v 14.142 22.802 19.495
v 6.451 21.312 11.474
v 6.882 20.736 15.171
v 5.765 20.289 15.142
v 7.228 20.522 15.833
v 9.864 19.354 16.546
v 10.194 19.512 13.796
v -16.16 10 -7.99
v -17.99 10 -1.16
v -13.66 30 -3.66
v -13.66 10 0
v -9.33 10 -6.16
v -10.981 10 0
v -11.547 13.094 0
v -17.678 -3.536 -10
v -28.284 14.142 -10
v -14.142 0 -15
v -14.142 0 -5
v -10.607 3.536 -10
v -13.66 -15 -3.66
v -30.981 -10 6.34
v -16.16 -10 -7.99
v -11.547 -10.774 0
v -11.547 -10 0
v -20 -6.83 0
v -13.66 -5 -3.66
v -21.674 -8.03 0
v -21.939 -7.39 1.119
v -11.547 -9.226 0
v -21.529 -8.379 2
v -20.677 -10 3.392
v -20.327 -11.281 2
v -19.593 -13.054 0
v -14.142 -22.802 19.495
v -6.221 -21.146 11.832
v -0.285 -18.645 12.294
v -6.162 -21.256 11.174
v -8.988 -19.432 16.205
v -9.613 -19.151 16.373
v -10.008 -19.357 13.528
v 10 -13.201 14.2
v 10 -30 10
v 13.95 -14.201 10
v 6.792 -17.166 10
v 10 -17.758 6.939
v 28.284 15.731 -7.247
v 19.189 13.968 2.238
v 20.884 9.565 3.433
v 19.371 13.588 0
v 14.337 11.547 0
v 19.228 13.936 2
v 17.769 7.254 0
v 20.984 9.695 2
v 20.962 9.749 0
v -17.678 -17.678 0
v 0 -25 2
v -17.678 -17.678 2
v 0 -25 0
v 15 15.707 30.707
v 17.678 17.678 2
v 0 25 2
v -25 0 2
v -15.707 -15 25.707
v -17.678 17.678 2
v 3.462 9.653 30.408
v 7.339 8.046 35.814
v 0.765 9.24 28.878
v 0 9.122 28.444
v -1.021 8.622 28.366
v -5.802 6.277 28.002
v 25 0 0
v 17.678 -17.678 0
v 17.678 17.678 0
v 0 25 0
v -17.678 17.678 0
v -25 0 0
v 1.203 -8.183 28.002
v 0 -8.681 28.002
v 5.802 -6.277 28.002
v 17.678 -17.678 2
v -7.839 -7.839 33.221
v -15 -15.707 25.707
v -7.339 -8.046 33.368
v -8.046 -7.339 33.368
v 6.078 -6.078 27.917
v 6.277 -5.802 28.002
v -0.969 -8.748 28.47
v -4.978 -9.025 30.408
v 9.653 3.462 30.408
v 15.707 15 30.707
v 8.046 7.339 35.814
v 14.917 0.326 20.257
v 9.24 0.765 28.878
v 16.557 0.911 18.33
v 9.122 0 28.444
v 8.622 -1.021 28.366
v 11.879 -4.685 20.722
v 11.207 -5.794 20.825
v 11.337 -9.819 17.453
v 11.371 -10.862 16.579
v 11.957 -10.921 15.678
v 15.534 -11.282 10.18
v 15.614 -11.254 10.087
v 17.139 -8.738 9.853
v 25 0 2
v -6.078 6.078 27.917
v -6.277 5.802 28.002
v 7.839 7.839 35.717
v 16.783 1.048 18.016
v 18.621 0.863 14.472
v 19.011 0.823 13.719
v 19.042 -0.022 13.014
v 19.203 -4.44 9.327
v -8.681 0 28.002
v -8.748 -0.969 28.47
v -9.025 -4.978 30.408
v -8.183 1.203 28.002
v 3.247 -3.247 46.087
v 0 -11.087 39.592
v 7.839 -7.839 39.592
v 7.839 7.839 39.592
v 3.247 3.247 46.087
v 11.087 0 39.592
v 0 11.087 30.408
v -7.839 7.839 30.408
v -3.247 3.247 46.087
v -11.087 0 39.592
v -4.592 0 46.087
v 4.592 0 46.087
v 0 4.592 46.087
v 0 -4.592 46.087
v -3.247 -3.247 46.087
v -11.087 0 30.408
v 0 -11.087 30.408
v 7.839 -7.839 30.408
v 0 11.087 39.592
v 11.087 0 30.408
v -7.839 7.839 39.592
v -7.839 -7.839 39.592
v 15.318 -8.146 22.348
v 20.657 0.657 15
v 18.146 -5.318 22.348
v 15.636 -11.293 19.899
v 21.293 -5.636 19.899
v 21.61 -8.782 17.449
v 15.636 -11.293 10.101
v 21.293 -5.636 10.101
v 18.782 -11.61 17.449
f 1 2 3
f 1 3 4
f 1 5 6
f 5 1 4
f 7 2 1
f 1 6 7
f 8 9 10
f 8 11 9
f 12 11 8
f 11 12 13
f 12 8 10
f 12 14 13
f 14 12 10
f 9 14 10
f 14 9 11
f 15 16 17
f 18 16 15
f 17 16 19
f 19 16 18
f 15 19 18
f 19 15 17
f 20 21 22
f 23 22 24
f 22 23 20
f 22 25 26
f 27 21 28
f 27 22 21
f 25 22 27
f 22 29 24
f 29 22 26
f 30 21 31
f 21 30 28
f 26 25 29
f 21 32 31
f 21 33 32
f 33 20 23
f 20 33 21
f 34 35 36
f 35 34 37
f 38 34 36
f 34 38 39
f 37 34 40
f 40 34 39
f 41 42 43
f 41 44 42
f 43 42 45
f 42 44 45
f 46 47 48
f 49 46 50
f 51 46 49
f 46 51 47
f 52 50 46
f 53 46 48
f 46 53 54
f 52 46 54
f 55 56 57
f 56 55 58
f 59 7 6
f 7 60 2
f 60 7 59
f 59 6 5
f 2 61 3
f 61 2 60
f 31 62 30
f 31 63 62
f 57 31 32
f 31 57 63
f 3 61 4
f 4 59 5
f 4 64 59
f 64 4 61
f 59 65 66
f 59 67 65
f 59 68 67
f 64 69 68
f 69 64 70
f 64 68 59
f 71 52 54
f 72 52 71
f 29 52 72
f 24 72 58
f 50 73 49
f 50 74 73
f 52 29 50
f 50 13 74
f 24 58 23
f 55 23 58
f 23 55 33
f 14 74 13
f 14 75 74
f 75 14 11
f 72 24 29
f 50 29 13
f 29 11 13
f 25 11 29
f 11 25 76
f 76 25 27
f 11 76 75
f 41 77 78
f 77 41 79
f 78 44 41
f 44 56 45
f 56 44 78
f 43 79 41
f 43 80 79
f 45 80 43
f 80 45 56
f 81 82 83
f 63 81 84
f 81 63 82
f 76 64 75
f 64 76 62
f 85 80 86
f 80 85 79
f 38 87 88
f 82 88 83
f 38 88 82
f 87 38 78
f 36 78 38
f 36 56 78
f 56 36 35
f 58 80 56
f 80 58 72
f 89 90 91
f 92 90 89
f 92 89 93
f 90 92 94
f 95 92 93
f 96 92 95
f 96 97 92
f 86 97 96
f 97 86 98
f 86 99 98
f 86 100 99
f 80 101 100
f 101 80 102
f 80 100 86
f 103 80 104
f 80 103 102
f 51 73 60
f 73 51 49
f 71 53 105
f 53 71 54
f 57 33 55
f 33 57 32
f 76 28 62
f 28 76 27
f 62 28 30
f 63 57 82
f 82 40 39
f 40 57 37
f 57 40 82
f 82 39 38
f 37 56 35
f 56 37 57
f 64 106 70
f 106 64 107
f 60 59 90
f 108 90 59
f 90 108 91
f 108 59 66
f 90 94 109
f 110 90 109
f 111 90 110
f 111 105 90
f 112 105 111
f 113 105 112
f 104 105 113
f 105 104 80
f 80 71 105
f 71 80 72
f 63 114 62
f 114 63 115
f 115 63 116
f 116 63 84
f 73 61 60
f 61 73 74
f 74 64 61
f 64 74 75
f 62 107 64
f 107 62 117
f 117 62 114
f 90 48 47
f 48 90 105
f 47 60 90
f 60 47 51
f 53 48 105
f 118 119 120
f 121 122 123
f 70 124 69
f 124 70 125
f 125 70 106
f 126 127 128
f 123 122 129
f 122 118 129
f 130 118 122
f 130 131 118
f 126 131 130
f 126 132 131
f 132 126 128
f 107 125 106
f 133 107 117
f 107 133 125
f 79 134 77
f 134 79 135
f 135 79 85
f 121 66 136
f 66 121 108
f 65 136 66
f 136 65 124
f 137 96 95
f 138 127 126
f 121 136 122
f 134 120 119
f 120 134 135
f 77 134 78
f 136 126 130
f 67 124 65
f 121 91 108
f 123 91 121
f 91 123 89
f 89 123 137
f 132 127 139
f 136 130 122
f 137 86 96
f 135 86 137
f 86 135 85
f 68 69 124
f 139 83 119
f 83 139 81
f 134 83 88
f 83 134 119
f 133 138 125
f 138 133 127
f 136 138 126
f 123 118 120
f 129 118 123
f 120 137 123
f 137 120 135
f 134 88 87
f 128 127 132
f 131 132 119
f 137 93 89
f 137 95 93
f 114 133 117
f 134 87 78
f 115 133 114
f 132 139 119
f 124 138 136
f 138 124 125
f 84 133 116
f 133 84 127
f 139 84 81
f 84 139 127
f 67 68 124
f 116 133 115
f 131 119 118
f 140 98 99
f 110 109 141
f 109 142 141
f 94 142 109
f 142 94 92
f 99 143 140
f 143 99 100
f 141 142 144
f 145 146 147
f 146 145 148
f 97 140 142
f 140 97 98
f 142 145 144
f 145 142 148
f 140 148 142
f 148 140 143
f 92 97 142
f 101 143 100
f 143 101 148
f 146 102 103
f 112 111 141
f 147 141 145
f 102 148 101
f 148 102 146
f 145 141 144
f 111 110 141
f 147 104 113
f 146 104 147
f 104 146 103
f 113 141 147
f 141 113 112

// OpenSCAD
$fn = 12;

module mountain_peak() {
    // Base rock
    hull() {
        cylinder(h=2, r=25, $fn=8);
        translate([0,0,40]) sphere(r=1, $fn=4);
        translate([15,15,30]) sphere(r=1, $fn=4);
        translate([-15,-15,25]) sphere(r=1, $fn=4);
    }
    
    // Adding some jaggedness
    for (i = [0 : 7]) {
        rotate([i * 45, i * 30, i * 90])
        translate([10, 10, 10])
        cylinder(h = 20, r1 = 5, r2 = 0, $fn = 4);
    }
}

module snow_cap() {
    // Snow layer on top
    translate([0,0,35])
    color("white")
    sphere(r=12, $fn=8);
    
    // Some snow on the sides
    translate([15, -5, 15])
    rotate([45, 0, 45])
    color("white")
    sphere(r=8, $fn=6);
}

union() {
    mountain_peak();
    snow_cap();
}
